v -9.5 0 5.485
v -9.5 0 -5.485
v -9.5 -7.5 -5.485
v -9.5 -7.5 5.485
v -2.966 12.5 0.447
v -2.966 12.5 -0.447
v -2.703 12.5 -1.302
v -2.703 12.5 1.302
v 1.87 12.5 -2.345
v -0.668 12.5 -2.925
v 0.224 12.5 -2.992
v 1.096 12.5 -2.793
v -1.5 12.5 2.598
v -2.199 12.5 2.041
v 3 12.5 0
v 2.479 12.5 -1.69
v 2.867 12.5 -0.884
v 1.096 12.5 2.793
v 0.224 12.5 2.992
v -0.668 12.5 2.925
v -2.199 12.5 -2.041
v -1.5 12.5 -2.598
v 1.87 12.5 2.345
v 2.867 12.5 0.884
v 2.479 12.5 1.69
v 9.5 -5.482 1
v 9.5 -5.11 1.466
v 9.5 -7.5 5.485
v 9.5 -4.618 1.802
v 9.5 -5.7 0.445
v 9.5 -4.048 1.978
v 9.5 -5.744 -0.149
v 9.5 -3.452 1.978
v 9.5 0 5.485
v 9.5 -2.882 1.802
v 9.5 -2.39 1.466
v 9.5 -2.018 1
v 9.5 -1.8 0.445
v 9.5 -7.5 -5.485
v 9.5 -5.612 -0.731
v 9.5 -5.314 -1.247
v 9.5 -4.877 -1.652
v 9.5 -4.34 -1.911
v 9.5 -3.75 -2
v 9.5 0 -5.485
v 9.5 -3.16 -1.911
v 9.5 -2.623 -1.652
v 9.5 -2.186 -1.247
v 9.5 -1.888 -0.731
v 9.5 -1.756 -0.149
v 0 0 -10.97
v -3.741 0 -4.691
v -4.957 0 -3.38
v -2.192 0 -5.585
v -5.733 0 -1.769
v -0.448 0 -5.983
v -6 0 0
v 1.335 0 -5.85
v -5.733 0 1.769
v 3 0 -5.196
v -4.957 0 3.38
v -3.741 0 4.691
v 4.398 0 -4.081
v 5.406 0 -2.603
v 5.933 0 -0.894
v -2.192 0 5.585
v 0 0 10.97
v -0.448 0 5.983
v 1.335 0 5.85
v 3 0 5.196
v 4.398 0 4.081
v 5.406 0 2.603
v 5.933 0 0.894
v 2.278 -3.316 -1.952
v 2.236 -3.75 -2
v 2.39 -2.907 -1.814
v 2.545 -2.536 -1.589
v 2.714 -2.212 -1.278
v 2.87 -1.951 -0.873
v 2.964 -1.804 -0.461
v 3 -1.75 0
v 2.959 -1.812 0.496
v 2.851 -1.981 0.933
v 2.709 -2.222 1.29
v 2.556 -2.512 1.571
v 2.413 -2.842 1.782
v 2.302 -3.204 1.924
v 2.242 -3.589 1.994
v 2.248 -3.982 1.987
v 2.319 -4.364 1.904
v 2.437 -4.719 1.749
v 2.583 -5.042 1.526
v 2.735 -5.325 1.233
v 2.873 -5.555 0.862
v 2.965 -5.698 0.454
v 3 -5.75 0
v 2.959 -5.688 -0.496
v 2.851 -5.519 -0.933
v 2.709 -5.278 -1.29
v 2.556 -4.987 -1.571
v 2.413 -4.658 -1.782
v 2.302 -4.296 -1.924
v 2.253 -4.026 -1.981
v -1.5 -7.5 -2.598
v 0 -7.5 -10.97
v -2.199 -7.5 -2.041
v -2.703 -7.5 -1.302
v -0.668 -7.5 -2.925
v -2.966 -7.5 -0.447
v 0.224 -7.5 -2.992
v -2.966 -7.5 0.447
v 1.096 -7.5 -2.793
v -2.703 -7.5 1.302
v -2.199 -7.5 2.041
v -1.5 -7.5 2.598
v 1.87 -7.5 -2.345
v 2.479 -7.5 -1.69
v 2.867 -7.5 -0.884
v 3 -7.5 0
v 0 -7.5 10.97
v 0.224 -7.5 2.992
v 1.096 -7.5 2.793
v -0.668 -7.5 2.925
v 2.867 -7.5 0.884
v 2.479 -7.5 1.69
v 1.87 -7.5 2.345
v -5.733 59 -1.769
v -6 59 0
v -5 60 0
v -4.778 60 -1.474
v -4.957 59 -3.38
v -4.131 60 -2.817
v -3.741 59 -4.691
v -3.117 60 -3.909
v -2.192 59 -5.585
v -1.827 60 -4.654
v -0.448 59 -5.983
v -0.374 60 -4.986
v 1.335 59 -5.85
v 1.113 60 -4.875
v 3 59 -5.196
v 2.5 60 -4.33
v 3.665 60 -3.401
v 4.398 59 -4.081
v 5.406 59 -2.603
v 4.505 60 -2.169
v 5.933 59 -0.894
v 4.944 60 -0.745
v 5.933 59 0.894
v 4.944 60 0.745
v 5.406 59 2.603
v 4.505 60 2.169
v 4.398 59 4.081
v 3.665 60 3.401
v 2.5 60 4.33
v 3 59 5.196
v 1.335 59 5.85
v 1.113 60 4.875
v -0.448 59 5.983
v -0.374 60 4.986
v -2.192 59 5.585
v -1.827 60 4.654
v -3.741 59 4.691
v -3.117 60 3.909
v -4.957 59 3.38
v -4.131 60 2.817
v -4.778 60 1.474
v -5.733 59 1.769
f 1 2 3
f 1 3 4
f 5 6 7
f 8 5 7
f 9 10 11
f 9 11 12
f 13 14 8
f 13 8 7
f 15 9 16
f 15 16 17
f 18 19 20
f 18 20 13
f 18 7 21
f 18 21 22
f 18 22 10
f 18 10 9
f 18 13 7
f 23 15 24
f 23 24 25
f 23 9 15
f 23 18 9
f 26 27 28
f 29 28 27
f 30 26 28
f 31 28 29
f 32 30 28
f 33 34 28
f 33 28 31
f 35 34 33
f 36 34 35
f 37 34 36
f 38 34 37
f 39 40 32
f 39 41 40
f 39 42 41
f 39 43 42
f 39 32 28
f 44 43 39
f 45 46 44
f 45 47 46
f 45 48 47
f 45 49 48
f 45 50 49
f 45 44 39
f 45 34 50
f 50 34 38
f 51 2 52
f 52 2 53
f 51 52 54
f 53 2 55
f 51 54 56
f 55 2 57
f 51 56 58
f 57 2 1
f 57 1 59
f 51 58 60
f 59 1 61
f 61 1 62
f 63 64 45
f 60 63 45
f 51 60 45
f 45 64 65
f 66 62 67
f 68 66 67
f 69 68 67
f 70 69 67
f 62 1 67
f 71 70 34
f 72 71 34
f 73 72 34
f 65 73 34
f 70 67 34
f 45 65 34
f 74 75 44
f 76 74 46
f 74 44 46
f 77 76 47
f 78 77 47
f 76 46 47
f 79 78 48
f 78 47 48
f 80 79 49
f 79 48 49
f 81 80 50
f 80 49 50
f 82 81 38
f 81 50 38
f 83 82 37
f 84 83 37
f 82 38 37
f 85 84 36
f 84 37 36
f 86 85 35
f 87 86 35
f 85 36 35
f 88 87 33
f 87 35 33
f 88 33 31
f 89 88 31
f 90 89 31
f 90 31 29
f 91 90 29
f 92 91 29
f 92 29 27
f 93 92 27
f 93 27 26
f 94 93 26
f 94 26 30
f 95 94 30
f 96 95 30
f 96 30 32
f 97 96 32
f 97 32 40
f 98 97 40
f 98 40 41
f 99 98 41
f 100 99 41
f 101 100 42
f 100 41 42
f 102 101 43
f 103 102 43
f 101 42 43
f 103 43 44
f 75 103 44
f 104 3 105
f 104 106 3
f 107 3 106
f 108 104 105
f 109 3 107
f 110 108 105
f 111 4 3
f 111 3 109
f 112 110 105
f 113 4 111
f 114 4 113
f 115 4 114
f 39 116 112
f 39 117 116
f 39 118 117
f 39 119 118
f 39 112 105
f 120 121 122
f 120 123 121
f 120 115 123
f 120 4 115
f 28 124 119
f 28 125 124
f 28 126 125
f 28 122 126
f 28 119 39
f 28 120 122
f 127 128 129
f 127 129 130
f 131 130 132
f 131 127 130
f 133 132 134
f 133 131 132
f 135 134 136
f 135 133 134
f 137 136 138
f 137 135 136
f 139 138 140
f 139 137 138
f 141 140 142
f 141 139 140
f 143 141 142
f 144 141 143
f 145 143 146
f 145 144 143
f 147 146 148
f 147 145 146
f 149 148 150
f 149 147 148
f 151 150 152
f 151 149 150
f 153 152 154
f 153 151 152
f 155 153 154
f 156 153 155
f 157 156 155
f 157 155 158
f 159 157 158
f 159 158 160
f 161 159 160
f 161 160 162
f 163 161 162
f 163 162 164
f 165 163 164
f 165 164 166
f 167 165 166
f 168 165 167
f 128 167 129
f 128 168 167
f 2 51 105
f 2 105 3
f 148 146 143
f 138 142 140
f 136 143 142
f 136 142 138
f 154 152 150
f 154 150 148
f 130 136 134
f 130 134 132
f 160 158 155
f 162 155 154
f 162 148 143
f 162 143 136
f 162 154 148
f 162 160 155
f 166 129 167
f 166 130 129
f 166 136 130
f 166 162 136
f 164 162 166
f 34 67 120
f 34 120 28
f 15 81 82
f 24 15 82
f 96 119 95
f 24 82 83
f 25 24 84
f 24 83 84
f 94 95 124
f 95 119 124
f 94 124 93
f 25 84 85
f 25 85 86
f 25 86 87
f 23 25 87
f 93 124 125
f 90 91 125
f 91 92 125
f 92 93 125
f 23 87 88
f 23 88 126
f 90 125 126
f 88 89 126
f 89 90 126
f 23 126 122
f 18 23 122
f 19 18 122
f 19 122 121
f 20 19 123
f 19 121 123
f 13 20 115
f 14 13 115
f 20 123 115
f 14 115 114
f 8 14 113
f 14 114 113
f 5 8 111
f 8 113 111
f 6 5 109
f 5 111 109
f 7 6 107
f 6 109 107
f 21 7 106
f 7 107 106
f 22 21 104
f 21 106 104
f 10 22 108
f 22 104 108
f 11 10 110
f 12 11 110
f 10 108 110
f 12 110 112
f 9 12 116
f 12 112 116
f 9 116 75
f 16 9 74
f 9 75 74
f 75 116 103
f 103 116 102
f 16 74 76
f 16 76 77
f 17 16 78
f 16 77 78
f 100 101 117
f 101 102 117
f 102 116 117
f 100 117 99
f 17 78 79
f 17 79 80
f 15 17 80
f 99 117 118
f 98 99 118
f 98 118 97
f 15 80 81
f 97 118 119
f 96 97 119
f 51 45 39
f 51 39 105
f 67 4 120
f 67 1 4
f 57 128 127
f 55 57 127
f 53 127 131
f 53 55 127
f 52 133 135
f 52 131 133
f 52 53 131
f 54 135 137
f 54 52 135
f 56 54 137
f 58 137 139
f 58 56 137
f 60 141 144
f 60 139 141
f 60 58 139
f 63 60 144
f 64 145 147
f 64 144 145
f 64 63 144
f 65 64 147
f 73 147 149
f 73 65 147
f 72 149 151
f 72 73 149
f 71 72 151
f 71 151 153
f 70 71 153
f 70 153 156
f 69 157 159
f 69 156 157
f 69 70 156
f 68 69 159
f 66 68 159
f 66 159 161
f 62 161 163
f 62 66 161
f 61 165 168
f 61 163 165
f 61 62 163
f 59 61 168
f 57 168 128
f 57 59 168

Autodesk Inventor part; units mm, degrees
ref_plane "YZ Plane" through (0, 0, 0) normal (1, 0, 0) x (0, 1, 0)
ref_plane "XZ Plane" through (0, 0, 0) normal (0, 1, 0) x (-1, 0, 0)
ref_plane "XY Plane" through (0, 0, 0) normal (0, 0, 1) x (1, 0, 0)
sketch "Эскиз1" plane through (0, 0, 0) normal (0, 1, 0) x (-1, 0, 0)
  circle A0 centre (0, 0) radius 6
  dimension "d0" = 12
extrude "Выдавливание1" add sketch "Эскиз1" along normal blind 60
thread "Резьба1" size "M12x1.75" class "6g" standard "ANSI Metric M Profile" full length
sketch "Эскиз2" plane through (0, 0, 0) normal (0, -1, 0) x (1, 0, 0)
  line L0 (9.5, 5.4848) -> (9.5, -5.4848)
  line L1 (9.5, -5.4848) -> (0, -10.9697)
  line L2 (0, -10.9697) -> (-9.5, -5.4848)
  line L3 (-9.5, -5.4848) -> (-9.5, 5.4848)
  line L4 (-9.5, 5.4848) -> (0, 10.9697)
  line L5 (0, 10.9697) -> (9.5, 5.4848)
  line L6 (0, -15.3575) -> (0, 15.3575) construction
  point P0 (0, 0)
  point P1 (0, 0)
  dimension "d5" = 19
extrude "Выдавливание2" add sketch "Эскиз2" along normal blind 7.5
sketch "Эскиз3" plane through (0, -7.5, 0) normal (0, -1, 0) x (1, 0, 0)
  circle A0 centre (0, 0) radius 3
  dimension "d8" = 6
extrude "Выдавливание3" cut sketch "Эскиз3" against normal blind 20
sketch "Эскиз4" plane through (9.5, 0, 5.4848) normal (1, 0, 0) x (0, 0, -1)
  circle A0 centre (5.4848, -3.75) radius 2
  line L0 (10.9697, -7.5) -> (0, -7.5) projected
  point P0 (5.4848, 0)
  dimension "d11" = 4
  dimension "d12" = 3.75
extrude "Выдавливание4" cut sketch "Эскиз4" against normal blind 8.5
thread "Резьба2" size "M4x0.7" class "6H" standard "ANSI Metric M Profile" full length
chamfer "Фаска1" distance 1 angle 45 1 edges at (6, 60, 0)
properties part number "KB33-046-002-002 - Втулка"
